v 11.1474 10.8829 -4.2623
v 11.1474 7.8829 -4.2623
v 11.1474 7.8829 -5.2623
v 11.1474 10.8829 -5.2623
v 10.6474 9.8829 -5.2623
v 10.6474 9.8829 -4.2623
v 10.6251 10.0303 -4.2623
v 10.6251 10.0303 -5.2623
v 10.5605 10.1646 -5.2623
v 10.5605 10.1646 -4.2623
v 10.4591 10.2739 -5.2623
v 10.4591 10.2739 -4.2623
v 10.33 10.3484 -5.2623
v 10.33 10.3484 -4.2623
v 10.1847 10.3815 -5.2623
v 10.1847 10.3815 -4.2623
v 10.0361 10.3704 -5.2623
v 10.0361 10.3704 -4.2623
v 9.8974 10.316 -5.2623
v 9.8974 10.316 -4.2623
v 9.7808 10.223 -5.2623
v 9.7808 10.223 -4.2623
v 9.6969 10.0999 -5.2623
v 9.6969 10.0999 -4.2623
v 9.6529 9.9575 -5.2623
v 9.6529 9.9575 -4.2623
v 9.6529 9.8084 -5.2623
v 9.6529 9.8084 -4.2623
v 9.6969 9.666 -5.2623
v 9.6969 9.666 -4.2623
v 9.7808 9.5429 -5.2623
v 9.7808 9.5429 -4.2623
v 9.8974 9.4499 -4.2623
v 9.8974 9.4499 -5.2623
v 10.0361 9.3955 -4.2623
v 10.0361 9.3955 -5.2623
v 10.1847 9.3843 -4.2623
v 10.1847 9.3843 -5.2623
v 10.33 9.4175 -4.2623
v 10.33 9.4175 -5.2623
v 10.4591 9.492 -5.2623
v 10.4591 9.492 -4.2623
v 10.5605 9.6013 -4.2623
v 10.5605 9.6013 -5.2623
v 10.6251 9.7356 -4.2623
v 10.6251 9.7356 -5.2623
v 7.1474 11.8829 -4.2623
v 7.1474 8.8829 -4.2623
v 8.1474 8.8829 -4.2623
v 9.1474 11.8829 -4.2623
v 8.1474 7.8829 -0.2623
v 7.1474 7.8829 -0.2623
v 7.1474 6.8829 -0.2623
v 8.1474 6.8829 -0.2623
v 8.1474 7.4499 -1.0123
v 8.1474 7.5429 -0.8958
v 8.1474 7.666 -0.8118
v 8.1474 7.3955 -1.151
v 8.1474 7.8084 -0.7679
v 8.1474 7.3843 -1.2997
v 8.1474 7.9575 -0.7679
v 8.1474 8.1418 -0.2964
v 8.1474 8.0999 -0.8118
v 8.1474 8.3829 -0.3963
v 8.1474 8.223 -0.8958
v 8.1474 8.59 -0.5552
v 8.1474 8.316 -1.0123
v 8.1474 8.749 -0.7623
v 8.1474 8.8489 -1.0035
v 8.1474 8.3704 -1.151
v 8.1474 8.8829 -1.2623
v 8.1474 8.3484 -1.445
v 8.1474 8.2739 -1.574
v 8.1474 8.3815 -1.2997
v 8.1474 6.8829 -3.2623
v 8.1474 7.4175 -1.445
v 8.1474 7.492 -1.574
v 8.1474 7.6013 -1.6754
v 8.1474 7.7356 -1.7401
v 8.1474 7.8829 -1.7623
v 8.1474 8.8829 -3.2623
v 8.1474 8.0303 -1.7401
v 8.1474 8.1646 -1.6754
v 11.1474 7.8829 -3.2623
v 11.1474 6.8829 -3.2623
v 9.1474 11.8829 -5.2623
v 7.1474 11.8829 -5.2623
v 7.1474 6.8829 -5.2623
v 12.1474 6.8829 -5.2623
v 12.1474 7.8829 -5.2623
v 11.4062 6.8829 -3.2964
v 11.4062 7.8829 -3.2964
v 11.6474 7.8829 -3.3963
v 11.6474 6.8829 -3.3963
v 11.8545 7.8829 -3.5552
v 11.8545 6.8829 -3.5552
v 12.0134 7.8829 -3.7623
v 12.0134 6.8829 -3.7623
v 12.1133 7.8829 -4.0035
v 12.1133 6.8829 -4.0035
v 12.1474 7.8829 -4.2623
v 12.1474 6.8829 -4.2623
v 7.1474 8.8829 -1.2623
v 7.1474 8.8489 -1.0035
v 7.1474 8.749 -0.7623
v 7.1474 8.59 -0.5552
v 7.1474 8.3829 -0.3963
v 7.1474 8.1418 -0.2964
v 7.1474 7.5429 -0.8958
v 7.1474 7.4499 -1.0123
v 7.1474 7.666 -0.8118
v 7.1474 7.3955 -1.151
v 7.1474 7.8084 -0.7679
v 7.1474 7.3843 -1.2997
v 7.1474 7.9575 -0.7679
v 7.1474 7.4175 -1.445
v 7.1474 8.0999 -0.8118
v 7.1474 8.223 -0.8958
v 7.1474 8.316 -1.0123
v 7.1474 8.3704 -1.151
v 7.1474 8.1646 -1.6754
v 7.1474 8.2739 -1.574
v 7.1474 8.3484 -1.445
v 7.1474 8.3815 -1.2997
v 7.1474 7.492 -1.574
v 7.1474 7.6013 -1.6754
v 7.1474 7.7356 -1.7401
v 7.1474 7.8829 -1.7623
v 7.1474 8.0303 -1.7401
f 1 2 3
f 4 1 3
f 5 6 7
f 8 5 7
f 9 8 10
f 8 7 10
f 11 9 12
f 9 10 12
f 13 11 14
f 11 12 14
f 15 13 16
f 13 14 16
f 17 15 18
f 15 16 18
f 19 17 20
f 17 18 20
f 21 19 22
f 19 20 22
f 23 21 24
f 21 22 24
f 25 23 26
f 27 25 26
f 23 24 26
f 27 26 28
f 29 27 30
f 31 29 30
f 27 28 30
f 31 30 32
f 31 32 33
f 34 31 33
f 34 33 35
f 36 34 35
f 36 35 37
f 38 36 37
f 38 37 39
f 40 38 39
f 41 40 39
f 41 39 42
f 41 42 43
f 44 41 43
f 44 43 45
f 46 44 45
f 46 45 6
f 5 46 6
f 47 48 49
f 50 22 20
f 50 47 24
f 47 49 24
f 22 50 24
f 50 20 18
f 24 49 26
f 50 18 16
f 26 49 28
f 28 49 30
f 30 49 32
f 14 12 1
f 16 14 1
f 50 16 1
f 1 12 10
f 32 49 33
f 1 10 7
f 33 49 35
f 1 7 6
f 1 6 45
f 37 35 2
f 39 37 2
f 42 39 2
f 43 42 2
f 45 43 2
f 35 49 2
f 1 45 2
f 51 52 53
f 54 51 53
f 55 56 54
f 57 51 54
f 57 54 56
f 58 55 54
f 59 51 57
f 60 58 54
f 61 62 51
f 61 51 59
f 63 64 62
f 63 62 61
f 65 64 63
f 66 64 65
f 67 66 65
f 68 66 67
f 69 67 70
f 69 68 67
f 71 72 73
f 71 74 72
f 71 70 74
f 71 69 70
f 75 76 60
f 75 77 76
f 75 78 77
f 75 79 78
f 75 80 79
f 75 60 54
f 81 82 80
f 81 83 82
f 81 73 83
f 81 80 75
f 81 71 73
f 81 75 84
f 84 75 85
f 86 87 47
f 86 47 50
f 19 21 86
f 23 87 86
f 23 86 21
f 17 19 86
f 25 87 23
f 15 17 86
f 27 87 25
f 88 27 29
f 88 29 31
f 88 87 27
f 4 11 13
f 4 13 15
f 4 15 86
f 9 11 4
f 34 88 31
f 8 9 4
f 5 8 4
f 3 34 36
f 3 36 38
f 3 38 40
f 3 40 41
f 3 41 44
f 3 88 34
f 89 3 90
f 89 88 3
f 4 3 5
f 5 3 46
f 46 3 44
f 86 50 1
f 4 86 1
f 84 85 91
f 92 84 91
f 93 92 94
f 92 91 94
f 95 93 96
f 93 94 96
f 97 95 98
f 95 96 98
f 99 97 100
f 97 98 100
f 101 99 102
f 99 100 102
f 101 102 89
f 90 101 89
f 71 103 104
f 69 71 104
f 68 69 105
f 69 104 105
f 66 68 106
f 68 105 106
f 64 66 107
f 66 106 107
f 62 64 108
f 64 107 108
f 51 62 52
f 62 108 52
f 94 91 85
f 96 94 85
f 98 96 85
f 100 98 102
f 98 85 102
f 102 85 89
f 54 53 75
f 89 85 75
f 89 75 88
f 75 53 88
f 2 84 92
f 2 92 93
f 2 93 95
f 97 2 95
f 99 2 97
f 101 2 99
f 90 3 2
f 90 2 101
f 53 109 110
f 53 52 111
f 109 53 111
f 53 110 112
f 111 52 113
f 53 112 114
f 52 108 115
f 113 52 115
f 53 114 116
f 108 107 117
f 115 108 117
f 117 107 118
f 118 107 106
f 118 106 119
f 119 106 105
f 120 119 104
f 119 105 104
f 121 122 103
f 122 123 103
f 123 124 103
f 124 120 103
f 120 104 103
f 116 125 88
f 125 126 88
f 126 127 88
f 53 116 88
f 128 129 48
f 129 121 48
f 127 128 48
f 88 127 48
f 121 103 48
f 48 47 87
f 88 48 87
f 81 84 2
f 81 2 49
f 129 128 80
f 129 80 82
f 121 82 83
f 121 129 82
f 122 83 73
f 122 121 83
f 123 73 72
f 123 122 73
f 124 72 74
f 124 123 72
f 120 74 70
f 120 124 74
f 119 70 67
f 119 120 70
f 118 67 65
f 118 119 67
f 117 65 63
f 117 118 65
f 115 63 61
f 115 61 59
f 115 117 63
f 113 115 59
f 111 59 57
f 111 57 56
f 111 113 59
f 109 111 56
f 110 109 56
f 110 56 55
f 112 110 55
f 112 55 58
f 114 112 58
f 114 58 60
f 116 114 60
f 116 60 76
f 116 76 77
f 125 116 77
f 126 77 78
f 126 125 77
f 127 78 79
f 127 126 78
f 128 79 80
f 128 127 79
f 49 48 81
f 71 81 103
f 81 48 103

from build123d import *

# Parameters (mm, degrees)
EXTRUDE_1_DEPTH     = 5
SKETCH_1_3_W        = 20
SKETCH_1_3_H        = 5
EXTRUDE_2_DEPTH     = 10
SKETCH_1_4_W        = 20
SKETCH_1_4_H        = 5
EXTRUDE_3_DEPTH     = 25
SKETCH_2_R          = 2.5
CUT_EXTRUDE_1_DEPTH = 25
CUT_EXTRUDE_2_DEPTH = 5
SKETCH_4_R          = 2.5
EXTRUDE_4_DEPTH     = 5
SCALE_1_SCALE       = 0.2


with BuildPart() as part:
    # 草圖1 → 填料-伸長1 (new body)
    with BuildSketch(Plane(origin=(0, 0, 0), x_dir=(1, 0, 0), z_dir=(0, 1, 0))):
        with BuildLine():
            Line((20, 10), (20, 5))
            Line((20, 5), (20, 0))
            ThreePointArc((20, 0), (23.535533906, 1.464466094), (25, 5))
            Line((25, 5), (25, 10))
            Line((25, 10), (20, 10))
        make_face()
    extrude(amount=EXTRUDE_1_DEPTH)

    # 草圖1<3> → 填料-伸長2 (add)
    with BuildSketch(Plane(origin=(0, 0, 0), x_dir=(1, 0, 0), z_dir=(0, 1, 0))):
        with Locations((10, 2.5)):
            Rectangle(SKETCH_1_3_W, SKETCH_1_3_H)
    extrude(amount=EXTRUDE_2_DEPTH)

    # 草圖1<4> → 填料-伸長3 (add)
    with BuildSketch(Plane(origin=(0, 0, 0), x_dir=(1, 0, 0), z_dir=(0, 1, 0))):
        with Locations((10, 7.5)):
            Rectangle(SKETCH_1_4_W, SKETCH_1_4_H)
    extrude(amount=EXTRUDE_3_DEPTH)

    # 草圖2 → 除料-伸長1 (cut)
    with BuildSketch(Plane.XY.offset(-5)):
        with Locations((15, 15)):
            Circle(SKETCH_2_R)
        Polygon((10, 25), (20, 20), (20, 25), align=None)
    extrude(amount=-CUT_EXTRUDE_1_DEPTH, mode=Mode.SUBTRACT)

    # 草圖3 → 除料-伸長2 (cut)
    with BuildSketch(Plane.XY):
        Polygon((20, 5), (5, 10), (20, 10), align=None)
    extrude(amount=-CUT_EXTRUDE_2_DEPTH, mode=Mode.SUBTRACT)

    # 草圖4 → 填料-伸長4 (add)
    with BuildSketch(Plane(origin=(0, 0, 0), x_dir=(0, 0, -1), z_dir=(1, 0, 0))):
        with BuildLine():
            Line((0, 10), (-10, 10))
            ThreePointArc((-10, 10), (-13.535533906, 8.535533906), (-15, 5))
            Line((-15, 5), (-15, 0))
            Line((-15, 0), (0, 0))
            Line((0, 0), (0, 10))
        make_face()
        with Locations((-10, 5)):
            Circle(SKETCH_4_R, mode=Mode.SUBTRACT)
    extrude(amount=EXTRUDE_4_DEPTH)


with BuildPart() as part_1:
    # 縮放比例1: scaled about (8.934190185, 8.603677977, -4.077878453)
    add(part.part.scale(SCALE_1_SCALE).moved(Location((7.147352148, 6.882942382, -3.262302762))))


solid = part_1.part
